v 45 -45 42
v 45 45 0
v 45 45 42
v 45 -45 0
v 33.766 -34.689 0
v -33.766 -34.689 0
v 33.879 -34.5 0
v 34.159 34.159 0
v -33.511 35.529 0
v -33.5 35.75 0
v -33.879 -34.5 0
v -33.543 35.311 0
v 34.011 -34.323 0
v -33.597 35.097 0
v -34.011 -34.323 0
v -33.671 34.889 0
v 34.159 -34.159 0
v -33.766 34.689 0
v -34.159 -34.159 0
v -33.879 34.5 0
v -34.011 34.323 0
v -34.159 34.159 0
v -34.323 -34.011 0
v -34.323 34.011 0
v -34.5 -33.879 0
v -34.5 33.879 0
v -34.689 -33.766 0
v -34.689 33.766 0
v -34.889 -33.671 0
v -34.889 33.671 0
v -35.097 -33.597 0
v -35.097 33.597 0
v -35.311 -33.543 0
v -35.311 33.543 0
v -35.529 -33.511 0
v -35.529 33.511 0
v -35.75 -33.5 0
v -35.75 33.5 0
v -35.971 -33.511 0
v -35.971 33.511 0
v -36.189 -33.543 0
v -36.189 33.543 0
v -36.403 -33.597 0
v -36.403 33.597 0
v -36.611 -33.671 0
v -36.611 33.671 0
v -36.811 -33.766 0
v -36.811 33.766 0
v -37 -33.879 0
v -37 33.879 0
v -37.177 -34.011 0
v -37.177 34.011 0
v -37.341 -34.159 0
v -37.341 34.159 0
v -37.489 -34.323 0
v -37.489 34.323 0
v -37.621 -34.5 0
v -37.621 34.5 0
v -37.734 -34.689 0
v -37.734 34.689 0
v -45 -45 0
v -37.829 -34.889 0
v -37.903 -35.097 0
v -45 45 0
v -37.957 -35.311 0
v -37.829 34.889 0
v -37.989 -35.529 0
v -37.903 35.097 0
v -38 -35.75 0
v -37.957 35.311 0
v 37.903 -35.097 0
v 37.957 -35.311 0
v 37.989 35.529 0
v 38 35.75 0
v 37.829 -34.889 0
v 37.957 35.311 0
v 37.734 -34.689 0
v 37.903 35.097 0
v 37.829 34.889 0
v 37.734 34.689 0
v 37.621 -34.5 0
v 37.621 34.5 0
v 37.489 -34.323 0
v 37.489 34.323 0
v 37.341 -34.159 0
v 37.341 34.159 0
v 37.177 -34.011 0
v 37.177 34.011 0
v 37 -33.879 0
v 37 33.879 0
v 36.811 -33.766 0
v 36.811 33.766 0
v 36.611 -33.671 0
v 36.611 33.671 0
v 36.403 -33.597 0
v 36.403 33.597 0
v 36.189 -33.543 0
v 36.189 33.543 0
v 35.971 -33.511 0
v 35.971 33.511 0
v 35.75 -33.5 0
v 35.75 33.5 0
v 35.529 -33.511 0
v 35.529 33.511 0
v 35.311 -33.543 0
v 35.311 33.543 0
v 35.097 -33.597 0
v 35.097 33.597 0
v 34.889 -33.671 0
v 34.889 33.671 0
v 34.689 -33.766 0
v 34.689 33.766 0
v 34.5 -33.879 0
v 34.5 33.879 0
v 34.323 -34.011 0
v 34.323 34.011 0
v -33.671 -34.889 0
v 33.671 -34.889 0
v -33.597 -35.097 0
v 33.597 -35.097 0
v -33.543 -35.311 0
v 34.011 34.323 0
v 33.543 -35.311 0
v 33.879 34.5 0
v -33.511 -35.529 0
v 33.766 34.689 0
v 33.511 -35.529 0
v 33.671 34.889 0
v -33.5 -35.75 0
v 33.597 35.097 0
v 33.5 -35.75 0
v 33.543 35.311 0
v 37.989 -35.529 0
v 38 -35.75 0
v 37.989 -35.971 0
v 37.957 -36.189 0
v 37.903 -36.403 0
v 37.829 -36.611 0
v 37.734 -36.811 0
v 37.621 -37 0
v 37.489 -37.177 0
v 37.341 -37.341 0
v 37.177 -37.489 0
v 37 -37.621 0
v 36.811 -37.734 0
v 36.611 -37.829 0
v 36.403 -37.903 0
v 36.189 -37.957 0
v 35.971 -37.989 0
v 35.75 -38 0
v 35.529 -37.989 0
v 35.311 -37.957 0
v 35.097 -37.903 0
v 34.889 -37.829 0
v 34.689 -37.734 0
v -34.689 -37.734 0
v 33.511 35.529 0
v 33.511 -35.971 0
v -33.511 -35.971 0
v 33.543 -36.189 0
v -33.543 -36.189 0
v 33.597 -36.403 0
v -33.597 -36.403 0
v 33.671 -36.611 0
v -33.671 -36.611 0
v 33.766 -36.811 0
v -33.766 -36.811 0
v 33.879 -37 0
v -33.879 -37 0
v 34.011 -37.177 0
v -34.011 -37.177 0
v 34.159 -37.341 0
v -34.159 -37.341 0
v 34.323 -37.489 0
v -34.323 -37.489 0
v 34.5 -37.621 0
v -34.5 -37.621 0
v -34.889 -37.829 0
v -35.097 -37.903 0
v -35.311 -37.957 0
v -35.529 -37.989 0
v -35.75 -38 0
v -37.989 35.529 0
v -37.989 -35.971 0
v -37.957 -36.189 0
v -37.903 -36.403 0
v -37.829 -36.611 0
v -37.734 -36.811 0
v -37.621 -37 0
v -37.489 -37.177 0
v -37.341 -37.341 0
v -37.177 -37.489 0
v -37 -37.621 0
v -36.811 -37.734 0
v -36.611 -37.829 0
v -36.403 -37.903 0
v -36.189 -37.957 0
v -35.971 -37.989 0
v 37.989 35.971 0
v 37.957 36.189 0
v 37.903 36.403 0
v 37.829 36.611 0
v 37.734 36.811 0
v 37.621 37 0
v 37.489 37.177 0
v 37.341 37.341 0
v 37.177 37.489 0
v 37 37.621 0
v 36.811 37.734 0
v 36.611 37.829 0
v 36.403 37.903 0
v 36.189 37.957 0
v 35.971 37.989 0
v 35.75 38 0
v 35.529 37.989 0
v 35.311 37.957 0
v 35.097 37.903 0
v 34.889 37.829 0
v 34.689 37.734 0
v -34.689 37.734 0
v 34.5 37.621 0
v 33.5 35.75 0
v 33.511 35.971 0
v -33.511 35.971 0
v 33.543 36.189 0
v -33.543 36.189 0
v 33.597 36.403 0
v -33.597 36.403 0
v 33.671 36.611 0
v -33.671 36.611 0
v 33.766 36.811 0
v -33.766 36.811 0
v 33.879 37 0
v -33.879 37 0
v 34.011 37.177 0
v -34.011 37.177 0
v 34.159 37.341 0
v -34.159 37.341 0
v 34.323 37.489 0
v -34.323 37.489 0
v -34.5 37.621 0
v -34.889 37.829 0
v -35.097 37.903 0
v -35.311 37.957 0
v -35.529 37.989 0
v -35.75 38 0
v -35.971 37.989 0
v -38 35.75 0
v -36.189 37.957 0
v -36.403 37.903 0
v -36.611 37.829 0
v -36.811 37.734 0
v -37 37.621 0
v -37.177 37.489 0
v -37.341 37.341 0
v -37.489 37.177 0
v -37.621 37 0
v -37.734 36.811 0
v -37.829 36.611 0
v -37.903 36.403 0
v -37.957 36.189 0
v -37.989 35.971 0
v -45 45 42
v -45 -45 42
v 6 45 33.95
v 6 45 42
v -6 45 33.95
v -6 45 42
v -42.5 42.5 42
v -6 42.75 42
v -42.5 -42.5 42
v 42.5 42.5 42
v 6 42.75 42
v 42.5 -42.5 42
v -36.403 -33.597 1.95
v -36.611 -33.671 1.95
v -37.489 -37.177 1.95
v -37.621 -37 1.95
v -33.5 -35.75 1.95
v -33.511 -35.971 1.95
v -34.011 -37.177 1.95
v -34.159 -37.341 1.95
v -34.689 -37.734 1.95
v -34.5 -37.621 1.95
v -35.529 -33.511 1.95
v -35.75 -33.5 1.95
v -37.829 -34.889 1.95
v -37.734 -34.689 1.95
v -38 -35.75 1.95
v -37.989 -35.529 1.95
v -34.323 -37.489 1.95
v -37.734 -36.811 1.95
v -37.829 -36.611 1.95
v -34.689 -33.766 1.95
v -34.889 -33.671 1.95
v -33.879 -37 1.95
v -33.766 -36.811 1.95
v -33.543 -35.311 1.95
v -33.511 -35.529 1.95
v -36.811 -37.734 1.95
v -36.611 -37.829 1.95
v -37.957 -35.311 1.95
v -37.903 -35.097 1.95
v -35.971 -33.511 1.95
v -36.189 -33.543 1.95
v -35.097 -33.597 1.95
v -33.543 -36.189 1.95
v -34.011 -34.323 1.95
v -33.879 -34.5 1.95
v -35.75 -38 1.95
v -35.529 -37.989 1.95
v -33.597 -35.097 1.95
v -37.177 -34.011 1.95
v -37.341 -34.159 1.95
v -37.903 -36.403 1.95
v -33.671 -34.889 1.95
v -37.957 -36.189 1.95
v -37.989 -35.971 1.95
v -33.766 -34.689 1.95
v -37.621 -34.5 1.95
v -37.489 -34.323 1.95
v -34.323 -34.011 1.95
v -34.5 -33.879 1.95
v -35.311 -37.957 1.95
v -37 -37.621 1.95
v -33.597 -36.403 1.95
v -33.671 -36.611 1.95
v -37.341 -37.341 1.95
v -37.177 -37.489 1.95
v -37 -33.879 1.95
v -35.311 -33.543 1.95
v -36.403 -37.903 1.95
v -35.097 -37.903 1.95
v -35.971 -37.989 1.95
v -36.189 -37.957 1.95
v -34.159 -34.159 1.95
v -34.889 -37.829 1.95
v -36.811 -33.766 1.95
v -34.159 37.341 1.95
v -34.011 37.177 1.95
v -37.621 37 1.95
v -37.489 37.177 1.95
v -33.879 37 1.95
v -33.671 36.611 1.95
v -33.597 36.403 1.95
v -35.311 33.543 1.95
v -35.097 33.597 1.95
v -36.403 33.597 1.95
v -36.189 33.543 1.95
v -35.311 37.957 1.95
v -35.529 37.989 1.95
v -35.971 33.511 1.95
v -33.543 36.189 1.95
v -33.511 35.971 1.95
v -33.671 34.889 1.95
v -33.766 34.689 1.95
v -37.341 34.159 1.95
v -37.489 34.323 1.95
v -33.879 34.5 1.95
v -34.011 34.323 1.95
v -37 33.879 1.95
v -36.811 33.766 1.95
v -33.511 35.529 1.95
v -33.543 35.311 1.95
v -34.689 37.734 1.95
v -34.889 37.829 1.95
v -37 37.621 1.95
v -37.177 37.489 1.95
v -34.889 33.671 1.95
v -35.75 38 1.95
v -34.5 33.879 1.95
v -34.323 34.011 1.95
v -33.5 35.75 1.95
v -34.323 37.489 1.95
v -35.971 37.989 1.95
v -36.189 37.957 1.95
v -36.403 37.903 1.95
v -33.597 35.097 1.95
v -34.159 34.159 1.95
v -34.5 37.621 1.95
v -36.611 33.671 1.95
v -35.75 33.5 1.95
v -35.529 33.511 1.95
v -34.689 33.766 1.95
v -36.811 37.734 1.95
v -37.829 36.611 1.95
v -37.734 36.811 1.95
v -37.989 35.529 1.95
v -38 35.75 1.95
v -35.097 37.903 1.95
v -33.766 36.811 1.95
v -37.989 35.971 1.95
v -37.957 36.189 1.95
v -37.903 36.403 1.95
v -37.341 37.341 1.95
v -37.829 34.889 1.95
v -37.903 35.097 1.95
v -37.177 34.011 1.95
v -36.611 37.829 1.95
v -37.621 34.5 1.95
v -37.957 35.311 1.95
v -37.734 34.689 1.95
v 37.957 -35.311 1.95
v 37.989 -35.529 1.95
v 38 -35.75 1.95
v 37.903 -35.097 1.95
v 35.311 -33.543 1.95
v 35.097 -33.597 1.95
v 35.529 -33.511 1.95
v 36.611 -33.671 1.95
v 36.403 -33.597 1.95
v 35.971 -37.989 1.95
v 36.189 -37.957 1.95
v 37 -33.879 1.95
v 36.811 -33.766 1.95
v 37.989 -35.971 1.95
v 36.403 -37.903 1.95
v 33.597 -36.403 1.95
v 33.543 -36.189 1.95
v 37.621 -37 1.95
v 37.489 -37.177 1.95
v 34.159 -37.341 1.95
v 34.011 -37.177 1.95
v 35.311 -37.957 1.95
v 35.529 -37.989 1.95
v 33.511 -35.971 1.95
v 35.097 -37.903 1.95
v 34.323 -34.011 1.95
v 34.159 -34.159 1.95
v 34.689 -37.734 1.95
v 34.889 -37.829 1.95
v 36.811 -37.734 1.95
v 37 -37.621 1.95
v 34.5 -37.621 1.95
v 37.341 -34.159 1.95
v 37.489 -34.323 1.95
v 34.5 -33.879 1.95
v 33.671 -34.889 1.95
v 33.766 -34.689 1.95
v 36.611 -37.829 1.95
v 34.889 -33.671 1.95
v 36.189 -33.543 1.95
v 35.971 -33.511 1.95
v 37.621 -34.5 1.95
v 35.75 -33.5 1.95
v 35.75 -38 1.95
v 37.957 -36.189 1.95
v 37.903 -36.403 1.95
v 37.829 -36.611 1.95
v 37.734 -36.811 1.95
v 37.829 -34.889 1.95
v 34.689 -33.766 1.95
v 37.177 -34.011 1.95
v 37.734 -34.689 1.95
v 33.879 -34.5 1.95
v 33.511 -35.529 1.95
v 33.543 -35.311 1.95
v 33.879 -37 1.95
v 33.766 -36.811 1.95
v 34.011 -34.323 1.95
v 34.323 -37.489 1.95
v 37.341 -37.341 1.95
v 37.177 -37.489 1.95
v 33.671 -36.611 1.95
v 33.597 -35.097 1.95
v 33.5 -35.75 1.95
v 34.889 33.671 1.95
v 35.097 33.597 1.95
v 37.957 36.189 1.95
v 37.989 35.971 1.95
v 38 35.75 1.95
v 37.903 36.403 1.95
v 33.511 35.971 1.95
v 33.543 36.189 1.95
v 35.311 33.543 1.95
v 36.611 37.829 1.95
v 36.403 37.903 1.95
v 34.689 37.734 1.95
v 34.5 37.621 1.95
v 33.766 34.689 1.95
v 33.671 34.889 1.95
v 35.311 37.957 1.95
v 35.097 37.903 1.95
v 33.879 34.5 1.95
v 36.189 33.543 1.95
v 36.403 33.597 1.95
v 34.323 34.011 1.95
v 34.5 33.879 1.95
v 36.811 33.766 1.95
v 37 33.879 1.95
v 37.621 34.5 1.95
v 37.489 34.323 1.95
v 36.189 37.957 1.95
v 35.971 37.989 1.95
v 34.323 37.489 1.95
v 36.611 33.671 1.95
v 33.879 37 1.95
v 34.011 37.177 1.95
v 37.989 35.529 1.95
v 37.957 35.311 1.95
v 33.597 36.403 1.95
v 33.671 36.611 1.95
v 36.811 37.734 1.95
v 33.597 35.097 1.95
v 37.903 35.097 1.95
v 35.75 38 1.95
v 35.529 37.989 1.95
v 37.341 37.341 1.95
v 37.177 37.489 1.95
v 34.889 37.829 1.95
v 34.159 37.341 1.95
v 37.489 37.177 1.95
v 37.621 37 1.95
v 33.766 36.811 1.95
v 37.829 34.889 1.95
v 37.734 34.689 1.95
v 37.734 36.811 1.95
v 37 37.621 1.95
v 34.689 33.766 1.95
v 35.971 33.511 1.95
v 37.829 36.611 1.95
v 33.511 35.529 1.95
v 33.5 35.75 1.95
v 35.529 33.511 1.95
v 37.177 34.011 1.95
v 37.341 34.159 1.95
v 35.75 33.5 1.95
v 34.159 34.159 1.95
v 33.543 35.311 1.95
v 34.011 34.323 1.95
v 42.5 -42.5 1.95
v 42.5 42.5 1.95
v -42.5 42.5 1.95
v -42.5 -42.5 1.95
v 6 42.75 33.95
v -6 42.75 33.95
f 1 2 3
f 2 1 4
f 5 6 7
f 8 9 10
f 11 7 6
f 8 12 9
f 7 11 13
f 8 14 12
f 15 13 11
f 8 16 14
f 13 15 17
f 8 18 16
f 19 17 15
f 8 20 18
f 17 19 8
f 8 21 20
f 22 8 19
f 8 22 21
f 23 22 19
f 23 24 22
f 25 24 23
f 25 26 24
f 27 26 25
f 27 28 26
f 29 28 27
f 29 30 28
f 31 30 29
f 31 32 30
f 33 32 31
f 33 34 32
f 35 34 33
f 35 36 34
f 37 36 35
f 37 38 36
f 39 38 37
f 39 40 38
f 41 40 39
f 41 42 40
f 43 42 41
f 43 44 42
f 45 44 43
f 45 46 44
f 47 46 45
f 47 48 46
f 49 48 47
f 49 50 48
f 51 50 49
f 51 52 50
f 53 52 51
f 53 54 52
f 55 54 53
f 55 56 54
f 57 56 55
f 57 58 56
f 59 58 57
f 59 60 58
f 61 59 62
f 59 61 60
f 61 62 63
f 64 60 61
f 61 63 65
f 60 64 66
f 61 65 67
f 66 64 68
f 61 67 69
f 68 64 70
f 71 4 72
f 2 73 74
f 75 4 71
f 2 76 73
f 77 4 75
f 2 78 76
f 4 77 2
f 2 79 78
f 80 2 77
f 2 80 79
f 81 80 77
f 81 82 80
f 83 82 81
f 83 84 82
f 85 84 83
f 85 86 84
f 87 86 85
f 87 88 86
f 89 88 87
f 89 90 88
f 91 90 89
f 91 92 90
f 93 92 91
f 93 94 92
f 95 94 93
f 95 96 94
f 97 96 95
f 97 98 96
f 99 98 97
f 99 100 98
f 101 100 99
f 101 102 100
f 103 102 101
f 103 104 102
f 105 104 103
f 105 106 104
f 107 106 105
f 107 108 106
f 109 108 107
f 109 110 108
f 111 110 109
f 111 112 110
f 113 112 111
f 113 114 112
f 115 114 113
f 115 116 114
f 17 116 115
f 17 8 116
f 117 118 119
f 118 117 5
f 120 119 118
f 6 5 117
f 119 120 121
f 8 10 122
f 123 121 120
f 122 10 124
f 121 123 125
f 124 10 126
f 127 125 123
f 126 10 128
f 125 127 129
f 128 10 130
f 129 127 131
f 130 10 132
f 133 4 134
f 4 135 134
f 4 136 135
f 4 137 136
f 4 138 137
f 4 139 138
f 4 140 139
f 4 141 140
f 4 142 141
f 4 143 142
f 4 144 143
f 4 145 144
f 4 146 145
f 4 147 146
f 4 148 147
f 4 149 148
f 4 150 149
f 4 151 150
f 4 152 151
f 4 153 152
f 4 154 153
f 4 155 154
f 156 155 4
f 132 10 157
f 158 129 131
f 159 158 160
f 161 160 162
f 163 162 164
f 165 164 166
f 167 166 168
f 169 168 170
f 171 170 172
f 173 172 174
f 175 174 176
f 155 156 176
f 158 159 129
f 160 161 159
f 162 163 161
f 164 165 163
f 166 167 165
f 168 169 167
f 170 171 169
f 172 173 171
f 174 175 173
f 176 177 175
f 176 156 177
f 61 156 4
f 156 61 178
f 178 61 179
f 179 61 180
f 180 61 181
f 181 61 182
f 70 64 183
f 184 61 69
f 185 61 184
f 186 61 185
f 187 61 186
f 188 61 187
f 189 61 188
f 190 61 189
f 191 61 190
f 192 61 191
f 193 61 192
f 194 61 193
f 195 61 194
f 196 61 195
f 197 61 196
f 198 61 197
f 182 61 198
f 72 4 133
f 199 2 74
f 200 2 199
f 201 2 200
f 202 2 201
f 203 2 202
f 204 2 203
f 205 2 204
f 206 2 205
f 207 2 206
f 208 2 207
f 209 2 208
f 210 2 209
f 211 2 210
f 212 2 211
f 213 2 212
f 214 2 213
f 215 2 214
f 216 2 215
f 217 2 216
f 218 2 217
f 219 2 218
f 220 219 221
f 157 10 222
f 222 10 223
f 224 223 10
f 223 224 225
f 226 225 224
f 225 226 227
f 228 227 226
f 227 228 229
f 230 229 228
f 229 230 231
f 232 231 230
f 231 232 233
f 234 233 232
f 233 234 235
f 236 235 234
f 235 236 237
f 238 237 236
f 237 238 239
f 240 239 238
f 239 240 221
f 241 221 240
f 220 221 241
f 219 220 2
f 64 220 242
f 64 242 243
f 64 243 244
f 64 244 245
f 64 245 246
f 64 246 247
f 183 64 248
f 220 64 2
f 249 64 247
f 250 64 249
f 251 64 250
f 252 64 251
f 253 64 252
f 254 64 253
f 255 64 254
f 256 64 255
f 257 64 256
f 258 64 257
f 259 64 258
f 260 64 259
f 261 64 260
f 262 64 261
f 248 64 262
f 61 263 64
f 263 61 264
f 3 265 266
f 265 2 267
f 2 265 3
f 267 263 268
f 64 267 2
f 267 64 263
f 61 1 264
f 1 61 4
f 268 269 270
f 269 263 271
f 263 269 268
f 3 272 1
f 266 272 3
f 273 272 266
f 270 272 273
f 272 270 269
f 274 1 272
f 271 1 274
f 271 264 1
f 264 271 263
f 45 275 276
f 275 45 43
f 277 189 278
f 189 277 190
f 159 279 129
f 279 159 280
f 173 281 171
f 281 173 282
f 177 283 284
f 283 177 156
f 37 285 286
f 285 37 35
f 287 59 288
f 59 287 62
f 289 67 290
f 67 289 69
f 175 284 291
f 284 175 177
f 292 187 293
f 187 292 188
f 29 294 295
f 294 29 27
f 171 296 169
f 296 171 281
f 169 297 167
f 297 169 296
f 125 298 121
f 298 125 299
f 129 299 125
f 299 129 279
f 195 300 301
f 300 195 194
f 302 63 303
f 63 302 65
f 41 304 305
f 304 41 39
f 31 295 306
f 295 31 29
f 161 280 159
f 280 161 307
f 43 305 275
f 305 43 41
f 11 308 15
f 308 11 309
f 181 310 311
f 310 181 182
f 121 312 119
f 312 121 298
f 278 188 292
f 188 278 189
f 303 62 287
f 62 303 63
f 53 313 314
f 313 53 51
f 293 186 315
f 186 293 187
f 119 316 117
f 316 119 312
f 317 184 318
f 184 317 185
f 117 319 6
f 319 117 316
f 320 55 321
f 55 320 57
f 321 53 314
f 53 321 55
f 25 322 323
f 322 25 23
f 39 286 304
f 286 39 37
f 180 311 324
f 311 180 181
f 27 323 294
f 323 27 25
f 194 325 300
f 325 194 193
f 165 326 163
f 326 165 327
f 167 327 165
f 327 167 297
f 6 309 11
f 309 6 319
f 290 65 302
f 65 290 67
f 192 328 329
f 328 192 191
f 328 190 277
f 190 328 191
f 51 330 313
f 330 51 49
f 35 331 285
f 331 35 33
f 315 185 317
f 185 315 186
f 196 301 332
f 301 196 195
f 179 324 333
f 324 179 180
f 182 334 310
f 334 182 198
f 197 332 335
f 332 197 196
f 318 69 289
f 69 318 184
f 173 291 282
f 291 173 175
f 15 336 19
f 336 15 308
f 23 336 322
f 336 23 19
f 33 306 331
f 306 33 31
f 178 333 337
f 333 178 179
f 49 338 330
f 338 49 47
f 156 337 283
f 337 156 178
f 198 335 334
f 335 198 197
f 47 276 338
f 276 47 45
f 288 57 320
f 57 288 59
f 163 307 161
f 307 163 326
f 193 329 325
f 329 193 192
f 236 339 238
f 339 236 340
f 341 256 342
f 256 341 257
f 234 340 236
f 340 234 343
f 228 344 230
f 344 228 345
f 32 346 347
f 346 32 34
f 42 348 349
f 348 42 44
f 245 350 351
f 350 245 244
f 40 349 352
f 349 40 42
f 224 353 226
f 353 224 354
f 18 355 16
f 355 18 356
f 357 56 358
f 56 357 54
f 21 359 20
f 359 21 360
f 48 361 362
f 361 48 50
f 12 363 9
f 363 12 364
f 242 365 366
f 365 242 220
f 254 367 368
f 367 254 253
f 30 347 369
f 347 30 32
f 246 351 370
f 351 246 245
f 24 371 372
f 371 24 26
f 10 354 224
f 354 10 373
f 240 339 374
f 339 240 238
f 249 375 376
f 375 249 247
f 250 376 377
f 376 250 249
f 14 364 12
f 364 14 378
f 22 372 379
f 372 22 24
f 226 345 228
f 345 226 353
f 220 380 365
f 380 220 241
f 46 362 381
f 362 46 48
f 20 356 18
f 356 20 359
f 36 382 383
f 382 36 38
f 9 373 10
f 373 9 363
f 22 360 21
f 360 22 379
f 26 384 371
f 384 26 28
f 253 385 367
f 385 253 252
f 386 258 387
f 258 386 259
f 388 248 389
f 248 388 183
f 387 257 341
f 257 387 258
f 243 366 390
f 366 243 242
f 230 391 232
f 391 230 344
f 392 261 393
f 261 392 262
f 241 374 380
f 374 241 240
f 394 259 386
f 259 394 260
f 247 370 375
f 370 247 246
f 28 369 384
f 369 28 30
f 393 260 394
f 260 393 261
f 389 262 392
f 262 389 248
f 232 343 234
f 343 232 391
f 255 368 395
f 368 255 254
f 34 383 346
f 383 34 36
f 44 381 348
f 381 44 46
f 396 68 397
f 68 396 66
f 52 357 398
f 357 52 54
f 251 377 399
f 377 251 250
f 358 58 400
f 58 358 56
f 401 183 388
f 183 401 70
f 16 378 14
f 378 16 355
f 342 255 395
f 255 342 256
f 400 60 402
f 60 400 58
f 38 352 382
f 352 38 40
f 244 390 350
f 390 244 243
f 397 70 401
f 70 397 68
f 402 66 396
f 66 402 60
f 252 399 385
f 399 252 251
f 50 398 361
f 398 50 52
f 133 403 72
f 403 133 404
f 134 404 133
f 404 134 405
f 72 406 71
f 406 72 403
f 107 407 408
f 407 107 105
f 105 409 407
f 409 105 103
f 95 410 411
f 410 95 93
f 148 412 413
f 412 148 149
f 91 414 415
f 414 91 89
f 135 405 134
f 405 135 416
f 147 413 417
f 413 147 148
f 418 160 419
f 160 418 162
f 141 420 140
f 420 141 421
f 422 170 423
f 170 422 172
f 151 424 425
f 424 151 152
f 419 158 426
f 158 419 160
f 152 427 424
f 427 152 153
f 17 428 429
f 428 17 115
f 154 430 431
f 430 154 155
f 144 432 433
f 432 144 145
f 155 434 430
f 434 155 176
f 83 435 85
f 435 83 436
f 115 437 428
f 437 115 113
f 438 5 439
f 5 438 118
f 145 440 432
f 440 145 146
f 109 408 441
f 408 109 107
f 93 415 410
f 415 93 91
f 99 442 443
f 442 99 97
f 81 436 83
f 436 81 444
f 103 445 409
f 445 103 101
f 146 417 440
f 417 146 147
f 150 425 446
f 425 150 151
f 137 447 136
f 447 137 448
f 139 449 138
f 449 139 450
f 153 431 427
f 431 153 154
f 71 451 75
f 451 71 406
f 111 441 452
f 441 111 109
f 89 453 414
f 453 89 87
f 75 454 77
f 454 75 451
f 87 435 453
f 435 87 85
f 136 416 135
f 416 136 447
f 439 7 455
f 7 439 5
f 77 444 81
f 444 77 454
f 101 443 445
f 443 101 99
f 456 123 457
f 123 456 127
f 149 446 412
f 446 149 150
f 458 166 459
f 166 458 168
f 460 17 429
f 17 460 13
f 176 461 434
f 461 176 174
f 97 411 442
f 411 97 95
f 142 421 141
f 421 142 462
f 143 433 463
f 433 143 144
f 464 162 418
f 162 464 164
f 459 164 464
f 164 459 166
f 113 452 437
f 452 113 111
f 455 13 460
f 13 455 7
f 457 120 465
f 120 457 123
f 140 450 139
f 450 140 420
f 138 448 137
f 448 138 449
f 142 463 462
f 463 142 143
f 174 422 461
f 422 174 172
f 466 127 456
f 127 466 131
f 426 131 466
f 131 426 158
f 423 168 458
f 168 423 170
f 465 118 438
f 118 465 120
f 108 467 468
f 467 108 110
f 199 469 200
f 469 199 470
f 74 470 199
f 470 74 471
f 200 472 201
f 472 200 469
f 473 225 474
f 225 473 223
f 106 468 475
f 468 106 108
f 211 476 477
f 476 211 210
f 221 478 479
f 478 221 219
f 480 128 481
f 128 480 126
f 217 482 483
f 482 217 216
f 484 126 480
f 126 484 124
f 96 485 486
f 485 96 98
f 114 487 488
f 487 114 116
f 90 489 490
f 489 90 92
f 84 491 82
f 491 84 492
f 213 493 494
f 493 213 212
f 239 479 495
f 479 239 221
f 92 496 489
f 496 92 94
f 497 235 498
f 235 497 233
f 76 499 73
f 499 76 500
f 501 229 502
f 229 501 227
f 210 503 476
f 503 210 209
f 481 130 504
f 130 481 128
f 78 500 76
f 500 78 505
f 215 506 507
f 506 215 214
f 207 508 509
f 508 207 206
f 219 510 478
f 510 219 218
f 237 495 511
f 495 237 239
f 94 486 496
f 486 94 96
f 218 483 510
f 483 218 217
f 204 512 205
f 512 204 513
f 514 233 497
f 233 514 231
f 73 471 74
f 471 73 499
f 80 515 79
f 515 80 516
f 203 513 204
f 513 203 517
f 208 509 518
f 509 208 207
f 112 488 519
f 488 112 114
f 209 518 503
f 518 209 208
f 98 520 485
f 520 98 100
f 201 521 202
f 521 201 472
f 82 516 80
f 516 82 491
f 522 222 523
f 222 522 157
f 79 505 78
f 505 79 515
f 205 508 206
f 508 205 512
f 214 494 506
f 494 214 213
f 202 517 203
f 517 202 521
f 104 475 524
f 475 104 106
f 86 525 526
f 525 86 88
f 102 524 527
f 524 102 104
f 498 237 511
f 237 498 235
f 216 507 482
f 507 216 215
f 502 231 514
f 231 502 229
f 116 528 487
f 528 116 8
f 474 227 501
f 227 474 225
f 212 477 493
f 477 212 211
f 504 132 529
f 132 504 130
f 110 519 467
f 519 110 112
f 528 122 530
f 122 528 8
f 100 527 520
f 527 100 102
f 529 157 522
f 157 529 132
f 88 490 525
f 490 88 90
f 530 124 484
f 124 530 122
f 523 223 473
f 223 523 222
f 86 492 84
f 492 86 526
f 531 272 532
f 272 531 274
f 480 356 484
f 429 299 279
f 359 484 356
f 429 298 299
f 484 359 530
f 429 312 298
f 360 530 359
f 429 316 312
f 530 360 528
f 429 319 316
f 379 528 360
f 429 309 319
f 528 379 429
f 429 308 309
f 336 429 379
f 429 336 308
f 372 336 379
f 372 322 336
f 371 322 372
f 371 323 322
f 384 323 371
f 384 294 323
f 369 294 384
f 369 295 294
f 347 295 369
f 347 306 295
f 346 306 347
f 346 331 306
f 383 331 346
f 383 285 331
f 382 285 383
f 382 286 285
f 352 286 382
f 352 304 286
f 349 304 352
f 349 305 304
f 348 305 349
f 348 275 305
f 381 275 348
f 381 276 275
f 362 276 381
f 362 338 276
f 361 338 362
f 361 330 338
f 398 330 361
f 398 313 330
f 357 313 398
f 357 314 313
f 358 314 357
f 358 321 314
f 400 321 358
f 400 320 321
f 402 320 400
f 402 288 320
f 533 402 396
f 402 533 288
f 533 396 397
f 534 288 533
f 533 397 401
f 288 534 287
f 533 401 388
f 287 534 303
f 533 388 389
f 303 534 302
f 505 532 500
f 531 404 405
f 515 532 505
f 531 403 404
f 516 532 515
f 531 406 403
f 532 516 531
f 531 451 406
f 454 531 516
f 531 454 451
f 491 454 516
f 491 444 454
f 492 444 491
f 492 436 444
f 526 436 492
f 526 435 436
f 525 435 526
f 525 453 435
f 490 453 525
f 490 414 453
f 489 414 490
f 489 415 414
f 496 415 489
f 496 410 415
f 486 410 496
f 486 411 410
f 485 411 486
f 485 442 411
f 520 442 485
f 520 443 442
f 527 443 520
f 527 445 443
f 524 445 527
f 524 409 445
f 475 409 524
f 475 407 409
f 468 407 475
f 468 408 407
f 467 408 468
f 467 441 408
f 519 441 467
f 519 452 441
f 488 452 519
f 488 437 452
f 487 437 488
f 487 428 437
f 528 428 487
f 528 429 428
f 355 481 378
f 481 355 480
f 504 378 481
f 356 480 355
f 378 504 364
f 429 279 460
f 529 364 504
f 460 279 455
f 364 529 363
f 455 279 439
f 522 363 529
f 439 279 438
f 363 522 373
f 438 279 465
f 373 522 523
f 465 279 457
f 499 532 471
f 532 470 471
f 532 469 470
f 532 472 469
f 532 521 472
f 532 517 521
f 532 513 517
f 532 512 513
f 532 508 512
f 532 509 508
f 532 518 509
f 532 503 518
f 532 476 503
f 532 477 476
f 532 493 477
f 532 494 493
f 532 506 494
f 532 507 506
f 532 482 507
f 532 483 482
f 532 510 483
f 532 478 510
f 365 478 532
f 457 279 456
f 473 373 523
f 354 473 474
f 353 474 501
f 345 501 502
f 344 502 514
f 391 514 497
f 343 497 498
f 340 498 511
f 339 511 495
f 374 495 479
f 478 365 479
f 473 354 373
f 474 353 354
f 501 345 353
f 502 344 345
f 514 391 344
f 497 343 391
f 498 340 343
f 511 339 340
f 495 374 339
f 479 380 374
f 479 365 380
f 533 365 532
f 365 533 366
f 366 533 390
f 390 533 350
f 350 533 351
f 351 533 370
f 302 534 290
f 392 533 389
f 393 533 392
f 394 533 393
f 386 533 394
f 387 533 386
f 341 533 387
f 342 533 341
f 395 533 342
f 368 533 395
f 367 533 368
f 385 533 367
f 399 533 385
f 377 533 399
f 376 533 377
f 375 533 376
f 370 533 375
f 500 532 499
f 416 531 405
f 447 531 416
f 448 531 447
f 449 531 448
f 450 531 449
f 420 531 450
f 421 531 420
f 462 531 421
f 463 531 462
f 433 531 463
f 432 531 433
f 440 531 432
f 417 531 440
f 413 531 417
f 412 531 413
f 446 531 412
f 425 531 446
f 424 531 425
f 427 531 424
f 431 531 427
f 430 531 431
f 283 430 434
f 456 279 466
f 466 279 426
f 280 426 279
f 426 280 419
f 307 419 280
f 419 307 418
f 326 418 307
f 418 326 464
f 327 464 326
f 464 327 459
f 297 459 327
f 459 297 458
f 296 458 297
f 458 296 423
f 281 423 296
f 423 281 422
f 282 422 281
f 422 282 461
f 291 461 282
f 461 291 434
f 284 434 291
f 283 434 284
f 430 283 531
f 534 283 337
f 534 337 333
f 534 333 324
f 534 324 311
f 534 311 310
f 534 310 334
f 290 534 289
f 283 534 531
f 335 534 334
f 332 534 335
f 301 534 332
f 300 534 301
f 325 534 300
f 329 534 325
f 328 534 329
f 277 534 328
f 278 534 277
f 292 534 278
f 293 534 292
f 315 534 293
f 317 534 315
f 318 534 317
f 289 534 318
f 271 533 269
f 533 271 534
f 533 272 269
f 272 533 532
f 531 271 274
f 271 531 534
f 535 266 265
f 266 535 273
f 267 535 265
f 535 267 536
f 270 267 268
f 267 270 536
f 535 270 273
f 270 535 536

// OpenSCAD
// --- Dimensions (mm) ---
outer_width = 90;          // Outer dimension of the square box (X)
outer_length = 90;         // Outer dimension of the square box (Y)
wall_thickness = 2.5;      // Thickness of the four vertical walls
top_plate_thickness = 2;   // Thickness of the top plate (the stirring surface)
total_wall_height = 40;    // Height of the walls rising from the plate
screw_hole_diameter = 4.5; // Diameter for M4 screw holes
screw_pattern_size = 71.5; // Distance between screw hole centers
notch_width = 12;          // Width of the cable notch
notch_depth = 8;           // Depth of the notch from the open edge
$fn = 64;                  // Smoothness for circular features

// --- Implementation ---
// The part is printed upside down.
// The top plate (stirring surface) lies on the bed (z = 0 to 2).
// The walls rise from the plate to z = 42 (2 + 40).

difference() {
    // 1. The Main Body (Plate + Walls)
    union() {
        // The Top Plate (Base of the box in print orientation)
        // Positioned at Z = 0 to Z = 2
        translate([0, 0, top_plate_thickness / 2])
            cube([outer_width, outer_length, top_plate_thickness], center = true);
        
        // The Four Walls
        // They start at the top of the plate (Z = 2) and rise 40mm (to Z = 42)
        // The center of the wall block is at Z = 2 + (40/2) = 22
        translate([0, 0, top_plate_thickness + (total_wall_height / 2)])
            cube([outer_width, outer_length, total_wall_height], center = true);
    }

    // 2. Subtracting the Interior (Hollowing out the box)
    // The interior starts from the top of the plate (Z=2) up to the top (Z=42)
    // We use a slightly taller cube to ensure a clean cut through the top edge.
    translate([0, 0, top_plate_thickness + (total_wall_height / 2)])
        cube([outer_width - 2 * wall_thickness, outer_length - 2 * wall_thickness, total_wall_height + 0.1], center = true);

    // 3. Screw Holes (M4)
    // Drilled through the top plate (Z = 0 to 2)
    for (x = [-1, 1], y = [-1, 1]) {
        translate([x * screw_pattern_size / 2, y * screw_pattern_size / 2, -1])
            cylinder(d = screw_hole_diameter, h = top_plate_thickness + 2);
    }

    // 4. Cable Notch
    // Located in one wall, centered along the wall.
    // Reaches 8mm down from the open edge (z = 42 down to z = 34).
    // The notch is 12mm wide (X).
    // We place it on the wall at Y = outer_length/2.
    // The notch spans Z from (42 - 8) to 42.
    // We use a cube that is wider than the wall to ensure a clean cut through the wall.
    // The notch is 12mm wide (X), 8mm deep (Y), and 8mm high (Z).
    // To cut through the wall at Y=45, we translate the notch to the edge.
    translate([0, outer_length / 2, top_plate_thickness + total_wall_height - (notch_depth / 2)])
        cube([notch_width, wall_thickness + 2, notch_depth + 0.1], center = true);
}

// Verification of requirements:
// - Printed upside down: Top plate at Z=0 to 2. (Correct)
// - Outer size 90x90. (Correct)
// - Wall thickness 2.5. (Correct)
// - Top plate thickness 2. (Correct)
// - Walls rise to Z=42 (2+40). (Correct)
// - 4x 4.5mm holes on 71.5mm pattern. (Correct)
// - Notch: 12mm wide, 8mm down from open edge. (Correct)
